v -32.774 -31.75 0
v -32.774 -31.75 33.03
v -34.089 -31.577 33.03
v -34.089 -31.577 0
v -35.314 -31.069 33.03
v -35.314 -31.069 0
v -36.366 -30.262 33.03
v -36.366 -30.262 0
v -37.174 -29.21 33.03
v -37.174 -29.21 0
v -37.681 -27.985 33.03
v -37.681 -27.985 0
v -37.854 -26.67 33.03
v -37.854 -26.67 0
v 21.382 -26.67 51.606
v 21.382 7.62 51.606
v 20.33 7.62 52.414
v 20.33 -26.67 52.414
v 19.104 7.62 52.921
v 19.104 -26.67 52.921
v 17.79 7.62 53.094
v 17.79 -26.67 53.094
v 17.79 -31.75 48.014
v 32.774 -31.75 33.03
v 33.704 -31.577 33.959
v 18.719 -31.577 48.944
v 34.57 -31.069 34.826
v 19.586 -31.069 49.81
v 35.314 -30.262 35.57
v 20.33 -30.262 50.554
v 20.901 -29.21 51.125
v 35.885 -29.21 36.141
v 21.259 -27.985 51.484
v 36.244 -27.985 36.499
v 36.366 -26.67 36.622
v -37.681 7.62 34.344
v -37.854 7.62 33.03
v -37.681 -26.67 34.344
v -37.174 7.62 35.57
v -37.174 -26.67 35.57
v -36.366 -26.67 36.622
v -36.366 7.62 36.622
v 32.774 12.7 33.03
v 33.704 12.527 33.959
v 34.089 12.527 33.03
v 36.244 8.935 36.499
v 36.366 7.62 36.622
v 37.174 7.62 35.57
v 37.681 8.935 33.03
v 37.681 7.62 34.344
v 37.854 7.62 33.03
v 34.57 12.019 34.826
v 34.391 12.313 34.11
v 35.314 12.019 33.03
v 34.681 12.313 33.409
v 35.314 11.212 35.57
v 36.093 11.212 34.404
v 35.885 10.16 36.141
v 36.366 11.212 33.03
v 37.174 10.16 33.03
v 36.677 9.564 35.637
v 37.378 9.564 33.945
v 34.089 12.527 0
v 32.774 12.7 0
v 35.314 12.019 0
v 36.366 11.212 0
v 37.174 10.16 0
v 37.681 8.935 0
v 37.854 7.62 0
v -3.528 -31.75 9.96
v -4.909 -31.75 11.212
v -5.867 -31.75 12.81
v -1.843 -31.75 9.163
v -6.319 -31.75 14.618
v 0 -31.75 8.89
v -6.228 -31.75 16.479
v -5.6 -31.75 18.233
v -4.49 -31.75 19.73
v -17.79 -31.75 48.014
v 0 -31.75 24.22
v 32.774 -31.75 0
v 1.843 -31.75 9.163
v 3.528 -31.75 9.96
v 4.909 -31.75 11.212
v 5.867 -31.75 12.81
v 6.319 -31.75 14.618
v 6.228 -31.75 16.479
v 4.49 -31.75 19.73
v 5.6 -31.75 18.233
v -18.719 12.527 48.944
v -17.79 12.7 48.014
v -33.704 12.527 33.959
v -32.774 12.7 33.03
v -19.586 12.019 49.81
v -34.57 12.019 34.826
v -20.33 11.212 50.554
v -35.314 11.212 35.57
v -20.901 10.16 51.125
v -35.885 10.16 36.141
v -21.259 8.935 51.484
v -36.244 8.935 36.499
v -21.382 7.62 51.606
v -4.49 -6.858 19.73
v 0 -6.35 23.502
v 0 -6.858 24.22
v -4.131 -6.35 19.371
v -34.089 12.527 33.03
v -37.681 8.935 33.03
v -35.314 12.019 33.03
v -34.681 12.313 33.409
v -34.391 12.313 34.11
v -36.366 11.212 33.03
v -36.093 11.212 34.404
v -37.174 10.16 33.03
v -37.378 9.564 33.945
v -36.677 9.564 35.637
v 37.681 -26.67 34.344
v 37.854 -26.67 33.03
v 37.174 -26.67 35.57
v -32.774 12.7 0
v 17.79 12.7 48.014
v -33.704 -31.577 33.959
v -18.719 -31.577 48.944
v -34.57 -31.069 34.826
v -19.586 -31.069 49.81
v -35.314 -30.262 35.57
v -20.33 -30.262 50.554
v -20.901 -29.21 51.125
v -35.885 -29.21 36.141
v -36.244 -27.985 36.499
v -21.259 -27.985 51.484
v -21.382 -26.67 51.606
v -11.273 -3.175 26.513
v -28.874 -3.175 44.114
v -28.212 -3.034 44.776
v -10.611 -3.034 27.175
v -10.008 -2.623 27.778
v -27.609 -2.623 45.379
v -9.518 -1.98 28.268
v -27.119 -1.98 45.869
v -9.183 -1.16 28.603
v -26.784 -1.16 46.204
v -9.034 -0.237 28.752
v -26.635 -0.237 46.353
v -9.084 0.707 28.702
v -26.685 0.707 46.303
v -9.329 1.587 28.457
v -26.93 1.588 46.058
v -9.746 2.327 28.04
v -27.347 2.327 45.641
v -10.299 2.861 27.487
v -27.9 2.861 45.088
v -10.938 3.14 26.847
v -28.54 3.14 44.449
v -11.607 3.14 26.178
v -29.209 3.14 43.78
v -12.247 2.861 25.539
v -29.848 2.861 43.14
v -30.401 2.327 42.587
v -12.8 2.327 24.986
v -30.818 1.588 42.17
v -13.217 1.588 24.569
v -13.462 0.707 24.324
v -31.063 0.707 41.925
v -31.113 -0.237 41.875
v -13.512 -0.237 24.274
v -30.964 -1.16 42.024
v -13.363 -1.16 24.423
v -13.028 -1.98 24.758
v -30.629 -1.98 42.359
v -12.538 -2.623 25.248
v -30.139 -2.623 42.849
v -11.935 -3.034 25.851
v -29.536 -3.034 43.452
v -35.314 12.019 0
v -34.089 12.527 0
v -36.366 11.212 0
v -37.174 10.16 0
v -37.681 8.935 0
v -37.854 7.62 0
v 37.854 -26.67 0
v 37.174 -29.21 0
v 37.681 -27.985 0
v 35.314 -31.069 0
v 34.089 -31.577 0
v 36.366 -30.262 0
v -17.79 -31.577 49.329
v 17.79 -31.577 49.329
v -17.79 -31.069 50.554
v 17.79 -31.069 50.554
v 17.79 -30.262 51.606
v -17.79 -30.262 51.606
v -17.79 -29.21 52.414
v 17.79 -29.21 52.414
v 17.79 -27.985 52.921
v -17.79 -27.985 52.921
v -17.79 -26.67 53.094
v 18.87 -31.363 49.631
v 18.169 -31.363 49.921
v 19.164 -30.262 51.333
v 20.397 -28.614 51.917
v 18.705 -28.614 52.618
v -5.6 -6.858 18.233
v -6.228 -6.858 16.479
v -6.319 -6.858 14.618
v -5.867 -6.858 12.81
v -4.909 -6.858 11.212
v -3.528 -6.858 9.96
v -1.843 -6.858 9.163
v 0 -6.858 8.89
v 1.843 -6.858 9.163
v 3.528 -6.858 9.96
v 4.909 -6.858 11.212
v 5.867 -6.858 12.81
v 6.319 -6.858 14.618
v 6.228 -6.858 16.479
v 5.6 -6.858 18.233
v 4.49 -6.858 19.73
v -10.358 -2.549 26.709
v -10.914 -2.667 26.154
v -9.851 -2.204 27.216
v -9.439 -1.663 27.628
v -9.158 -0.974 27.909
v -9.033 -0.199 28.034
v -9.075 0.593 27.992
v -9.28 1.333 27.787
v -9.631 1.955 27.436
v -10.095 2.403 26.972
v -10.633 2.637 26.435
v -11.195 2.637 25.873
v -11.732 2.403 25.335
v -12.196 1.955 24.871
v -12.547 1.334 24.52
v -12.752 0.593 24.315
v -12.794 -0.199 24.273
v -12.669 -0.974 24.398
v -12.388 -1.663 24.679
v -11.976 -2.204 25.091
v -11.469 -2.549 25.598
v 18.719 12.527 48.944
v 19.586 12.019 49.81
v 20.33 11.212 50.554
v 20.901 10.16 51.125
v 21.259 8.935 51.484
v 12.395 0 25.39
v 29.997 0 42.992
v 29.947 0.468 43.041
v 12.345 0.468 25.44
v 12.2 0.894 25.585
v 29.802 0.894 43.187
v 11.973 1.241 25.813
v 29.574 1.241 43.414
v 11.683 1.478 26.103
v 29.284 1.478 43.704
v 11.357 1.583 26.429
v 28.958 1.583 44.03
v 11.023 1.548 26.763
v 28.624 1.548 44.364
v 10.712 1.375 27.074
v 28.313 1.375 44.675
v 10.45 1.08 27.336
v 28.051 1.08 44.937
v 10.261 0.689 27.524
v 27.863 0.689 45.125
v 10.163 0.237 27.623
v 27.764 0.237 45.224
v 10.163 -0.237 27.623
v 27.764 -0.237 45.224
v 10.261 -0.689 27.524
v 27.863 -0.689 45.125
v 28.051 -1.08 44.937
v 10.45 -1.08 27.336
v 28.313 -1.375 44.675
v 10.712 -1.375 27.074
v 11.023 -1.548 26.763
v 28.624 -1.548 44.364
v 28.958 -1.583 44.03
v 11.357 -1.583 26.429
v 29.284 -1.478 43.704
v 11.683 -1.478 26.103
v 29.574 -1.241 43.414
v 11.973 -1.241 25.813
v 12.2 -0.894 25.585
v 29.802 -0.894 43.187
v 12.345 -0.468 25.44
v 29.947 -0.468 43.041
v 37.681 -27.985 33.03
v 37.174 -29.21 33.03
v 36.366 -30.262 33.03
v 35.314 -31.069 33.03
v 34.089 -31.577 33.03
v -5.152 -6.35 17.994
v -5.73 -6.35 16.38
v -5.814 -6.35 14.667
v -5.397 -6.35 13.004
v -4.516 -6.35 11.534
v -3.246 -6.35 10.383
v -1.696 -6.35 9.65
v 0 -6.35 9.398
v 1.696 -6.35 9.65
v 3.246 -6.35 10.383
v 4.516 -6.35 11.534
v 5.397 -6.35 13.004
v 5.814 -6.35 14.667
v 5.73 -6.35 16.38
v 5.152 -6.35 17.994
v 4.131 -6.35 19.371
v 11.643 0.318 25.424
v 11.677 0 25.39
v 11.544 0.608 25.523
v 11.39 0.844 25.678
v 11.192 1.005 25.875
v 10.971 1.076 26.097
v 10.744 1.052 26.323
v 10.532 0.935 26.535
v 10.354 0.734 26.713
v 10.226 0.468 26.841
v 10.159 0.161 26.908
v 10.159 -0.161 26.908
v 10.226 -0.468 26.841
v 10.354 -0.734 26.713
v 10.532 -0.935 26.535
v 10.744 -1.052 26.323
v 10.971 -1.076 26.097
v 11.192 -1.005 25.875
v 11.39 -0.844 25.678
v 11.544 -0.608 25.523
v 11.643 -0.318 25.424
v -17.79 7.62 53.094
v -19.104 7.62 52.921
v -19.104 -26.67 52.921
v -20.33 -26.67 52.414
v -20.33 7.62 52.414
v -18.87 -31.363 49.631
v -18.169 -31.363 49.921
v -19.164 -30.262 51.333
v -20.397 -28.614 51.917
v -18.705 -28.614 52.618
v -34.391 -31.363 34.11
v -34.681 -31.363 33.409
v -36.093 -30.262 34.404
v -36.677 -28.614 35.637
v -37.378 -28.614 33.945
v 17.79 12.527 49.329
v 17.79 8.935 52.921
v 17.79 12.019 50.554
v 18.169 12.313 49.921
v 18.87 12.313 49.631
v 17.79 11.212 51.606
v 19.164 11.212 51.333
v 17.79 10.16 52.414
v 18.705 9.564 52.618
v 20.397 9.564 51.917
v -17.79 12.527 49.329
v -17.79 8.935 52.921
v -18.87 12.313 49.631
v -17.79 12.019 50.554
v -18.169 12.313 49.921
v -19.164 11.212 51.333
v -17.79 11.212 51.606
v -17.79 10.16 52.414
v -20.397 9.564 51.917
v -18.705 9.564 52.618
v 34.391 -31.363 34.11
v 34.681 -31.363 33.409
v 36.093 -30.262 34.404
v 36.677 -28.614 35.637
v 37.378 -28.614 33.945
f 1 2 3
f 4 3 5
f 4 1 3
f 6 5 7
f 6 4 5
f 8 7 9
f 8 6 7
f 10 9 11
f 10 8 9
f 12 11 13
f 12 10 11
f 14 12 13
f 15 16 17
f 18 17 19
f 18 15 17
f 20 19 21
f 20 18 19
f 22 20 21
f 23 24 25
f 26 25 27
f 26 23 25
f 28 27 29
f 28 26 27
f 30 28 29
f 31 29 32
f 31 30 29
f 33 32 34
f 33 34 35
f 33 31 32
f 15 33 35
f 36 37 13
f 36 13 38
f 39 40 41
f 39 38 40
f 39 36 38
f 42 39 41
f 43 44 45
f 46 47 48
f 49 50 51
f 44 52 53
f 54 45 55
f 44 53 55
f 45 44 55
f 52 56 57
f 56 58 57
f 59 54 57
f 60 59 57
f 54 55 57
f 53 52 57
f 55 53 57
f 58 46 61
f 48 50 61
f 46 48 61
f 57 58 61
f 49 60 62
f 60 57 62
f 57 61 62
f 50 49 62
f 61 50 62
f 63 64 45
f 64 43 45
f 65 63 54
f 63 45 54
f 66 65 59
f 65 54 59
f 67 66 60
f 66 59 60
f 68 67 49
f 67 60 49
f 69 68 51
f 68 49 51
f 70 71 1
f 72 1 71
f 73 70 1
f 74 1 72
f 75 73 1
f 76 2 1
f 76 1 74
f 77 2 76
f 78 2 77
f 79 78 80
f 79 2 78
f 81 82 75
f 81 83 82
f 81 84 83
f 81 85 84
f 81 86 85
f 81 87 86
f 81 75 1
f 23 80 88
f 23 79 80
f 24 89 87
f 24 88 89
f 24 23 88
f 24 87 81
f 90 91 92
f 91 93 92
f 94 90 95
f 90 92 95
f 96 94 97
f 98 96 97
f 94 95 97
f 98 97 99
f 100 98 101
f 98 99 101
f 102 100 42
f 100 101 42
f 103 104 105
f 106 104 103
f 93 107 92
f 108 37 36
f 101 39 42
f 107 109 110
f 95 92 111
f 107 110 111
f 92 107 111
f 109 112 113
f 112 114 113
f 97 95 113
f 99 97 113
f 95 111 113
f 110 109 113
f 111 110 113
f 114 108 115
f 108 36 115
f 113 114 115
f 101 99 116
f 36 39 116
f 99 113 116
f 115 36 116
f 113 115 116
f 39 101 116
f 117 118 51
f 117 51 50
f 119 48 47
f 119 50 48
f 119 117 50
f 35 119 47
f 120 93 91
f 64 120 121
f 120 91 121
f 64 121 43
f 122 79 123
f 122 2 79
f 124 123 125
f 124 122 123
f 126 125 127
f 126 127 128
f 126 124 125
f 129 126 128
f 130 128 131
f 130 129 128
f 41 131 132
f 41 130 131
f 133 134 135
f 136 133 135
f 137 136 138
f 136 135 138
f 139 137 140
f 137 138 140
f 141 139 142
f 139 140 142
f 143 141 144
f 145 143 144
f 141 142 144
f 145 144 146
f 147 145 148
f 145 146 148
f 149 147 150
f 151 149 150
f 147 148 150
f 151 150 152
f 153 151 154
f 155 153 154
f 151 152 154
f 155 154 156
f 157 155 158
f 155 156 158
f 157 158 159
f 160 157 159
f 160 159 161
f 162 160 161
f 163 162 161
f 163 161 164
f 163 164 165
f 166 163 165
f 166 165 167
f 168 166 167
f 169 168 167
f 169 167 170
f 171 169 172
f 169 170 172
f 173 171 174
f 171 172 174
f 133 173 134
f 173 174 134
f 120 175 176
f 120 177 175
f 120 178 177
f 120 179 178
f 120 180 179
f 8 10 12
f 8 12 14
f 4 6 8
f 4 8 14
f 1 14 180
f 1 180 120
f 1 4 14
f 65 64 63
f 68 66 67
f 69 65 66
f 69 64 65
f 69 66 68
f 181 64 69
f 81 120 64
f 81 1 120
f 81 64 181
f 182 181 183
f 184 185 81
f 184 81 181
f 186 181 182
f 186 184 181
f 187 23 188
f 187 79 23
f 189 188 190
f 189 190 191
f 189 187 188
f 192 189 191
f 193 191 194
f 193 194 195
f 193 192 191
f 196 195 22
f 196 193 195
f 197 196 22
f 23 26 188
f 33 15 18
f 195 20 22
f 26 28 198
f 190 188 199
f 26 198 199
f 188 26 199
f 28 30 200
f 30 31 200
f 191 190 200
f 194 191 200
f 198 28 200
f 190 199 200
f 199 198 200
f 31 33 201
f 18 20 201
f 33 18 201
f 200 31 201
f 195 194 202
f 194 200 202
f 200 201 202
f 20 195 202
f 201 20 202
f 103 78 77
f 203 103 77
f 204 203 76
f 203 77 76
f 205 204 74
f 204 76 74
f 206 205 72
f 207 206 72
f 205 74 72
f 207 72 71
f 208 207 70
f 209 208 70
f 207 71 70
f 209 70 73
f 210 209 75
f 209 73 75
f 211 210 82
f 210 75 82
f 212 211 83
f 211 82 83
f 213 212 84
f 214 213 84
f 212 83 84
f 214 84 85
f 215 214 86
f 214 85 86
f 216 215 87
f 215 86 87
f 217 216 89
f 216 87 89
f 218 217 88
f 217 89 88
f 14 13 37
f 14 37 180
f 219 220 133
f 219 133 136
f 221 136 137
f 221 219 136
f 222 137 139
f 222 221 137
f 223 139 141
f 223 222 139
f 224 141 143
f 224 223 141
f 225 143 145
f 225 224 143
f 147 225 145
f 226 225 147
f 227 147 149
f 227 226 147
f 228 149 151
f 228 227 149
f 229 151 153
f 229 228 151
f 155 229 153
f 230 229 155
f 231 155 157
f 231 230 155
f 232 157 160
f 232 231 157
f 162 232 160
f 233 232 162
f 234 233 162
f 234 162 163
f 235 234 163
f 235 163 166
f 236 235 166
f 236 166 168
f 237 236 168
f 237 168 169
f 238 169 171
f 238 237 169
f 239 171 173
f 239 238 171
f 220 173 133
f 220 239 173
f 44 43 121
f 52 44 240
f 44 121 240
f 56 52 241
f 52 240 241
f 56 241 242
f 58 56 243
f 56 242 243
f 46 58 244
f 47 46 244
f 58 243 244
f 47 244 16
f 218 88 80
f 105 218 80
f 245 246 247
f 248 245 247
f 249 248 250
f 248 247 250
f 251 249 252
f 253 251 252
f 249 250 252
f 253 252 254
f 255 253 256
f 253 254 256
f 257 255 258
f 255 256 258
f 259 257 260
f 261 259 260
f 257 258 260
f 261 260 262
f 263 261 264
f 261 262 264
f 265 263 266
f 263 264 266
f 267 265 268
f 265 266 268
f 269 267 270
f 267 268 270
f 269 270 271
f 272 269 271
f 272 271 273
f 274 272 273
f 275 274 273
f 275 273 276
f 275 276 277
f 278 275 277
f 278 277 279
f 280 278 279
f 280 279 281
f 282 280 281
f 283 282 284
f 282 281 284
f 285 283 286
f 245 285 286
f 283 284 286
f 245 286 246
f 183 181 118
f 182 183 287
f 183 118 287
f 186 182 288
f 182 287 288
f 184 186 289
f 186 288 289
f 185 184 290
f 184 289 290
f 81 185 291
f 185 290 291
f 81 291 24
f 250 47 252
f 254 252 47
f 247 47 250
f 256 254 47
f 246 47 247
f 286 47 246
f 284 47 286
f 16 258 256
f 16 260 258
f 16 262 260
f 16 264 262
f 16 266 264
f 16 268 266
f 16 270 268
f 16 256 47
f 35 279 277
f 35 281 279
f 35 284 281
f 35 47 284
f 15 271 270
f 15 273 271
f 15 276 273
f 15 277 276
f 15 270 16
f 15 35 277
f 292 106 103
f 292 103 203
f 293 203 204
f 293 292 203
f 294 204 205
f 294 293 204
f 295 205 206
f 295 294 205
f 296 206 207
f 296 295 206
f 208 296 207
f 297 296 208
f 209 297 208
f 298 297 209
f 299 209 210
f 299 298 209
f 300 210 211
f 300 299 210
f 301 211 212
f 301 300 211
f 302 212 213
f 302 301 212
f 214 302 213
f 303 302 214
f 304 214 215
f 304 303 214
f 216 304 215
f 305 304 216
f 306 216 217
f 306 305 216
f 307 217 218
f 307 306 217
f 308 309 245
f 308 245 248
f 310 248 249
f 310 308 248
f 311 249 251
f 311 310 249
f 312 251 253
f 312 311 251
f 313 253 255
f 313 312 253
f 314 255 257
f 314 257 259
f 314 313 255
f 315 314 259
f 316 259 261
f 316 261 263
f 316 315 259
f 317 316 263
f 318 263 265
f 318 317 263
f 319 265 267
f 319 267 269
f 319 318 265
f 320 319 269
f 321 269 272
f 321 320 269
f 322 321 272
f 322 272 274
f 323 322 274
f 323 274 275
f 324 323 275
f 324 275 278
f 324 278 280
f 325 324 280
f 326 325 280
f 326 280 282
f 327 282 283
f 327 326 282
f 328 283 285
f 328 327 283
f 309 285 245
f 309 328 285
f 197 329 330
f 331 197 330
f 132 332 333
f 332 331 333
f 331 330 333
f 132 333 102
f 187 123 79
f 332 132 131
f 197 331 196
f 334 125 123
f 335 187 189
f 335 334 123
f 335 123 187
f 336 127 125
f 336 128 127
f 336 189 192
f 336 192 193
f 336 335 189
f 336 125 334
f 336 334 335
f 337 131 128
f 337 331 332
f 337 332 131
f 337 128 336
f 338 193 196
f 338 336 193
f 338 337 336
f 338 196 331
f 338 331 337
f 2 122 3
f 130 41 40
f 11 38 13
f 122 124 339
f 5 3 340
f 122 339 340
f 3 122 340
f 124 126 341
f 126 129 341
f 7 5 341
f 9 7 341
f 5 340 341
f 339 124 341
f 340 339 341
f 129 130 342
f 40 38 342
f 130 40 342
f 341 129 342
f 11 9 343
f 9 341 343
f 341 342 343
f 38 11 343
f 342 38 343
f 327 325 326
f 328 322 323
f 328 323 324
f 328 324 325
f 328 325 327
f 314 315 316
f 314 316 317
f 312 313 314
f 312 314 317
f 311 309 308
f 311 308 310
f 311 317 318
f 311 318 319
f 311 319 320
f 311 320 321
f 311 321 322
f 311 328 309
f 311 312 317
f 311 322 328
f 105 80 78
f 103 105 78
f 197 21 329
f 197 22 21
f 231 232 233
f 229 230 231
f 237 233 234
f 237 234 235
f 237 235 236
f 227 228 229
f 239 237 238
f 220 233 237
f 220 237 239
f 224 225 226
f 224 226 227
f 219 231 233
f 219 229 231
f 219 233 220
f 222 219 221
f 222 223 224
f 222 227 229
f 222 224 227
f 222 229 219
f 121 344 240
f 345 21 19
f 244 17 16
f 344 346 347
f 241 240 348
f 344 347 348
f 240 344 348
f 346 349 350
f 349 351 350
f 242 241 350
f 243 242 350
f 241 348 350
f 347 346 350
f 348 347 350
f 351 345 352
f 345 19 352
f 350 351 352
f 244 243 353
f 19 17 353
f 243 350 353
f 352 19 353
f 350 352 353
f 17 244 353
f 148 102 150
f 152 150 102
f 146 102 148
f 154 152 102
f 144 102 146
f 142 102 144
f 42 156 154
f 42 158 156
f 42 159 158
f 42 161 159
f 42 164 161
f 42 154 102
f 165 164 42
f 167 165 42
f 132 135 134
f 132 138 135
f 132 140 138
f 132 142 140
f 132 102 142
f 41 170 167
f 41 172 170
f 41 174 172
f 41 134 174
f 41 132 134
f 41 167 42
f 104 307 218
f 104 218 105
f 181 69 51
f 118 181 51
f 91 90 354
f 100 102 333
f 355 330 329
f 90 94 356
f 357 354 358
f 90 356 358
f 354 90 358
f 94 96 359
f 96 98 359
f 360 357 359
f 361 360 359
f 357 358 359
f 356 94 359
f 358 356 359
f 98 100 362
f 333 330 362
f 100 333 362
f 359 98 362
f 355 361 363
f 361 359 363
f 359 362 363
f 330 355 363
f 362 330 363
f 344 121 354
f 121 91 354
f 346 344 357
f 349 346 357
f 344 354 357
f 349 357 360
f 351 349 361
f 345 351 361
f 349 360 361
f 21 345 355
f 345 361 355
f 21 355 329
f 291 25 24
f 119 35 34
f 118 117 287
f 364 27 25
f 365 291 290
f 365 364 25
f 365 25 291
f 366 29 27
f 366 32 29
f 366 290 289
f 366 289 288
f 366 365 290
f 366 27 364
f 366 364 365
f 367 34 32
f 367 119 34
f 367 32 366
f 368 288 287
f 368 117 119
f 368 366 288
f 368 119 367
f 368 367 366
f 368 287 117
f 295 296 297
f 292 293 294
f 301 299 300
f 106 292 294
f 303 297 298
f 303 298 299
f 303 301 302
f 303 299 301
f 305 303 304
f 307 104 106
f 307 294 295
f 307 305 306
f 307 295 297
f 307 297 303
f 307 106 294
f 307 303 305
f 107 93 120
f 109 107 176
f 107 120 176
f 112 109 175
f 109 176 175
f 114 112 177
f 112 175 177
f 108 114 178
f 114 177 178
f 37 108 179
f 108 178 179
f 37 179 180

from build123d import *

# Parameters (mm, degrees)
F1_DEPTH      = 31.75
F1_DEPTH_BACK = 12.7
F2_R          = 3.175
F3_DEPTH      = 25.4
F4_R          = 1.5875
F5_DEPTH      = 25.4
F7_DEPTH      = 25.4
F8_R          = 5.08
F9_SIZE       = 0.508


with BuildPart() as f1:
    # F0 (on Front) → F1 (new body, two sides)
    with BuildSketch(Plane.XZ) as f1_sk:
        Polygon((-37.854384, 0), (0, 0), (37.854384, 0), (37.854384, 35.133872), (19.893872, 53.094384), (0, 53.094384), (-19.893872, 53.094384), (-37.854384, 35.133872), align=None)
    extrude(amount=F1_DEPTH)
    extrude(f1_sk.sketch, amount=-F1_DEPTH_BACK)

    # F2 (on face) → F3 (cut)
    with BuildSketch(Plane(origin=(-36.494128, 0, 36.494128), x_dir=(0, -1, 0), z_dir=(-0.707107, 0, 0.707107))):
        with Locations((0, 10.776307)):
            Circle(F2_R)
    extrude(amount=-F3_DEPTH, mode=Mode.SUBTRACT)

    # F4 (on face) → F5 (cut)
    with BuildSketch(Plane(origin=(36.494128, 0, 36.494128), x_dir=(0.707107, 0, -0.707107), z_dir=(0.707107, 0, 0.707107))):
        with Locations((-10.776307, 0)):
            Circle(F4_R)
    extrude(amount=-F5_DEPTH, mode=Mode.SUBTRACT)

    # F6 (on face) → F7 (cut)
    with BuildSketch(Plane.XZ.offset(31.75)):
        with BuildLine():
            Line((0, 24.220256), (-4.490128, 19.730128))
            ThreePointArc((-4.490128, 19.730128), (0, 8.89), (4.490128, 19.730128))
            Line((4.490128, 19.730128), (0, 24.220256))
        make_face()
    extrude(amount=-F7_DEPTH, mode=Mode.SUBTRACT)

    # F8
    f8_edges = [f1.edges().sort_by_distance(p)[0] for p in [
        (-37.854384, 12.7, 17.566936),
        (-28.874128, 12.7, 44.114128),
        (0, 12.7, 53.094384),
        (28.874128, 12.7, 44.114128),
        (37.854384, 12.7, 17.566936),
        (-19.893872, -9.525, 53.094384),
        (-37.854384, -9.525, 35.133872),
        (-28.874128, -31.75, 44.114128),
        (-37.854384, -31.75, 17.566936),
        (0, -31.75, 53.094384),
        (19.893872, -9.525, 53.094384),
        (28.874128, -31.75, 44.114128),
        (37.854384, -31.75, 17.566936),
        (37.854384, -9.525, 35.133872),
    ]]
    fillet(f8_edges, radius=F8_R)

    # F9
    f9_edges = [f1.edges().sort_by_distance(p)[0] for p in [
        (0, -6.35, 8.89),
        (-10.913616, 3.175, 26.153616),
        (9.791084, 0, 27.276148),
    ]]
    chamfer(f9_edges, length=F9_SIZE)


solid = f1.part
